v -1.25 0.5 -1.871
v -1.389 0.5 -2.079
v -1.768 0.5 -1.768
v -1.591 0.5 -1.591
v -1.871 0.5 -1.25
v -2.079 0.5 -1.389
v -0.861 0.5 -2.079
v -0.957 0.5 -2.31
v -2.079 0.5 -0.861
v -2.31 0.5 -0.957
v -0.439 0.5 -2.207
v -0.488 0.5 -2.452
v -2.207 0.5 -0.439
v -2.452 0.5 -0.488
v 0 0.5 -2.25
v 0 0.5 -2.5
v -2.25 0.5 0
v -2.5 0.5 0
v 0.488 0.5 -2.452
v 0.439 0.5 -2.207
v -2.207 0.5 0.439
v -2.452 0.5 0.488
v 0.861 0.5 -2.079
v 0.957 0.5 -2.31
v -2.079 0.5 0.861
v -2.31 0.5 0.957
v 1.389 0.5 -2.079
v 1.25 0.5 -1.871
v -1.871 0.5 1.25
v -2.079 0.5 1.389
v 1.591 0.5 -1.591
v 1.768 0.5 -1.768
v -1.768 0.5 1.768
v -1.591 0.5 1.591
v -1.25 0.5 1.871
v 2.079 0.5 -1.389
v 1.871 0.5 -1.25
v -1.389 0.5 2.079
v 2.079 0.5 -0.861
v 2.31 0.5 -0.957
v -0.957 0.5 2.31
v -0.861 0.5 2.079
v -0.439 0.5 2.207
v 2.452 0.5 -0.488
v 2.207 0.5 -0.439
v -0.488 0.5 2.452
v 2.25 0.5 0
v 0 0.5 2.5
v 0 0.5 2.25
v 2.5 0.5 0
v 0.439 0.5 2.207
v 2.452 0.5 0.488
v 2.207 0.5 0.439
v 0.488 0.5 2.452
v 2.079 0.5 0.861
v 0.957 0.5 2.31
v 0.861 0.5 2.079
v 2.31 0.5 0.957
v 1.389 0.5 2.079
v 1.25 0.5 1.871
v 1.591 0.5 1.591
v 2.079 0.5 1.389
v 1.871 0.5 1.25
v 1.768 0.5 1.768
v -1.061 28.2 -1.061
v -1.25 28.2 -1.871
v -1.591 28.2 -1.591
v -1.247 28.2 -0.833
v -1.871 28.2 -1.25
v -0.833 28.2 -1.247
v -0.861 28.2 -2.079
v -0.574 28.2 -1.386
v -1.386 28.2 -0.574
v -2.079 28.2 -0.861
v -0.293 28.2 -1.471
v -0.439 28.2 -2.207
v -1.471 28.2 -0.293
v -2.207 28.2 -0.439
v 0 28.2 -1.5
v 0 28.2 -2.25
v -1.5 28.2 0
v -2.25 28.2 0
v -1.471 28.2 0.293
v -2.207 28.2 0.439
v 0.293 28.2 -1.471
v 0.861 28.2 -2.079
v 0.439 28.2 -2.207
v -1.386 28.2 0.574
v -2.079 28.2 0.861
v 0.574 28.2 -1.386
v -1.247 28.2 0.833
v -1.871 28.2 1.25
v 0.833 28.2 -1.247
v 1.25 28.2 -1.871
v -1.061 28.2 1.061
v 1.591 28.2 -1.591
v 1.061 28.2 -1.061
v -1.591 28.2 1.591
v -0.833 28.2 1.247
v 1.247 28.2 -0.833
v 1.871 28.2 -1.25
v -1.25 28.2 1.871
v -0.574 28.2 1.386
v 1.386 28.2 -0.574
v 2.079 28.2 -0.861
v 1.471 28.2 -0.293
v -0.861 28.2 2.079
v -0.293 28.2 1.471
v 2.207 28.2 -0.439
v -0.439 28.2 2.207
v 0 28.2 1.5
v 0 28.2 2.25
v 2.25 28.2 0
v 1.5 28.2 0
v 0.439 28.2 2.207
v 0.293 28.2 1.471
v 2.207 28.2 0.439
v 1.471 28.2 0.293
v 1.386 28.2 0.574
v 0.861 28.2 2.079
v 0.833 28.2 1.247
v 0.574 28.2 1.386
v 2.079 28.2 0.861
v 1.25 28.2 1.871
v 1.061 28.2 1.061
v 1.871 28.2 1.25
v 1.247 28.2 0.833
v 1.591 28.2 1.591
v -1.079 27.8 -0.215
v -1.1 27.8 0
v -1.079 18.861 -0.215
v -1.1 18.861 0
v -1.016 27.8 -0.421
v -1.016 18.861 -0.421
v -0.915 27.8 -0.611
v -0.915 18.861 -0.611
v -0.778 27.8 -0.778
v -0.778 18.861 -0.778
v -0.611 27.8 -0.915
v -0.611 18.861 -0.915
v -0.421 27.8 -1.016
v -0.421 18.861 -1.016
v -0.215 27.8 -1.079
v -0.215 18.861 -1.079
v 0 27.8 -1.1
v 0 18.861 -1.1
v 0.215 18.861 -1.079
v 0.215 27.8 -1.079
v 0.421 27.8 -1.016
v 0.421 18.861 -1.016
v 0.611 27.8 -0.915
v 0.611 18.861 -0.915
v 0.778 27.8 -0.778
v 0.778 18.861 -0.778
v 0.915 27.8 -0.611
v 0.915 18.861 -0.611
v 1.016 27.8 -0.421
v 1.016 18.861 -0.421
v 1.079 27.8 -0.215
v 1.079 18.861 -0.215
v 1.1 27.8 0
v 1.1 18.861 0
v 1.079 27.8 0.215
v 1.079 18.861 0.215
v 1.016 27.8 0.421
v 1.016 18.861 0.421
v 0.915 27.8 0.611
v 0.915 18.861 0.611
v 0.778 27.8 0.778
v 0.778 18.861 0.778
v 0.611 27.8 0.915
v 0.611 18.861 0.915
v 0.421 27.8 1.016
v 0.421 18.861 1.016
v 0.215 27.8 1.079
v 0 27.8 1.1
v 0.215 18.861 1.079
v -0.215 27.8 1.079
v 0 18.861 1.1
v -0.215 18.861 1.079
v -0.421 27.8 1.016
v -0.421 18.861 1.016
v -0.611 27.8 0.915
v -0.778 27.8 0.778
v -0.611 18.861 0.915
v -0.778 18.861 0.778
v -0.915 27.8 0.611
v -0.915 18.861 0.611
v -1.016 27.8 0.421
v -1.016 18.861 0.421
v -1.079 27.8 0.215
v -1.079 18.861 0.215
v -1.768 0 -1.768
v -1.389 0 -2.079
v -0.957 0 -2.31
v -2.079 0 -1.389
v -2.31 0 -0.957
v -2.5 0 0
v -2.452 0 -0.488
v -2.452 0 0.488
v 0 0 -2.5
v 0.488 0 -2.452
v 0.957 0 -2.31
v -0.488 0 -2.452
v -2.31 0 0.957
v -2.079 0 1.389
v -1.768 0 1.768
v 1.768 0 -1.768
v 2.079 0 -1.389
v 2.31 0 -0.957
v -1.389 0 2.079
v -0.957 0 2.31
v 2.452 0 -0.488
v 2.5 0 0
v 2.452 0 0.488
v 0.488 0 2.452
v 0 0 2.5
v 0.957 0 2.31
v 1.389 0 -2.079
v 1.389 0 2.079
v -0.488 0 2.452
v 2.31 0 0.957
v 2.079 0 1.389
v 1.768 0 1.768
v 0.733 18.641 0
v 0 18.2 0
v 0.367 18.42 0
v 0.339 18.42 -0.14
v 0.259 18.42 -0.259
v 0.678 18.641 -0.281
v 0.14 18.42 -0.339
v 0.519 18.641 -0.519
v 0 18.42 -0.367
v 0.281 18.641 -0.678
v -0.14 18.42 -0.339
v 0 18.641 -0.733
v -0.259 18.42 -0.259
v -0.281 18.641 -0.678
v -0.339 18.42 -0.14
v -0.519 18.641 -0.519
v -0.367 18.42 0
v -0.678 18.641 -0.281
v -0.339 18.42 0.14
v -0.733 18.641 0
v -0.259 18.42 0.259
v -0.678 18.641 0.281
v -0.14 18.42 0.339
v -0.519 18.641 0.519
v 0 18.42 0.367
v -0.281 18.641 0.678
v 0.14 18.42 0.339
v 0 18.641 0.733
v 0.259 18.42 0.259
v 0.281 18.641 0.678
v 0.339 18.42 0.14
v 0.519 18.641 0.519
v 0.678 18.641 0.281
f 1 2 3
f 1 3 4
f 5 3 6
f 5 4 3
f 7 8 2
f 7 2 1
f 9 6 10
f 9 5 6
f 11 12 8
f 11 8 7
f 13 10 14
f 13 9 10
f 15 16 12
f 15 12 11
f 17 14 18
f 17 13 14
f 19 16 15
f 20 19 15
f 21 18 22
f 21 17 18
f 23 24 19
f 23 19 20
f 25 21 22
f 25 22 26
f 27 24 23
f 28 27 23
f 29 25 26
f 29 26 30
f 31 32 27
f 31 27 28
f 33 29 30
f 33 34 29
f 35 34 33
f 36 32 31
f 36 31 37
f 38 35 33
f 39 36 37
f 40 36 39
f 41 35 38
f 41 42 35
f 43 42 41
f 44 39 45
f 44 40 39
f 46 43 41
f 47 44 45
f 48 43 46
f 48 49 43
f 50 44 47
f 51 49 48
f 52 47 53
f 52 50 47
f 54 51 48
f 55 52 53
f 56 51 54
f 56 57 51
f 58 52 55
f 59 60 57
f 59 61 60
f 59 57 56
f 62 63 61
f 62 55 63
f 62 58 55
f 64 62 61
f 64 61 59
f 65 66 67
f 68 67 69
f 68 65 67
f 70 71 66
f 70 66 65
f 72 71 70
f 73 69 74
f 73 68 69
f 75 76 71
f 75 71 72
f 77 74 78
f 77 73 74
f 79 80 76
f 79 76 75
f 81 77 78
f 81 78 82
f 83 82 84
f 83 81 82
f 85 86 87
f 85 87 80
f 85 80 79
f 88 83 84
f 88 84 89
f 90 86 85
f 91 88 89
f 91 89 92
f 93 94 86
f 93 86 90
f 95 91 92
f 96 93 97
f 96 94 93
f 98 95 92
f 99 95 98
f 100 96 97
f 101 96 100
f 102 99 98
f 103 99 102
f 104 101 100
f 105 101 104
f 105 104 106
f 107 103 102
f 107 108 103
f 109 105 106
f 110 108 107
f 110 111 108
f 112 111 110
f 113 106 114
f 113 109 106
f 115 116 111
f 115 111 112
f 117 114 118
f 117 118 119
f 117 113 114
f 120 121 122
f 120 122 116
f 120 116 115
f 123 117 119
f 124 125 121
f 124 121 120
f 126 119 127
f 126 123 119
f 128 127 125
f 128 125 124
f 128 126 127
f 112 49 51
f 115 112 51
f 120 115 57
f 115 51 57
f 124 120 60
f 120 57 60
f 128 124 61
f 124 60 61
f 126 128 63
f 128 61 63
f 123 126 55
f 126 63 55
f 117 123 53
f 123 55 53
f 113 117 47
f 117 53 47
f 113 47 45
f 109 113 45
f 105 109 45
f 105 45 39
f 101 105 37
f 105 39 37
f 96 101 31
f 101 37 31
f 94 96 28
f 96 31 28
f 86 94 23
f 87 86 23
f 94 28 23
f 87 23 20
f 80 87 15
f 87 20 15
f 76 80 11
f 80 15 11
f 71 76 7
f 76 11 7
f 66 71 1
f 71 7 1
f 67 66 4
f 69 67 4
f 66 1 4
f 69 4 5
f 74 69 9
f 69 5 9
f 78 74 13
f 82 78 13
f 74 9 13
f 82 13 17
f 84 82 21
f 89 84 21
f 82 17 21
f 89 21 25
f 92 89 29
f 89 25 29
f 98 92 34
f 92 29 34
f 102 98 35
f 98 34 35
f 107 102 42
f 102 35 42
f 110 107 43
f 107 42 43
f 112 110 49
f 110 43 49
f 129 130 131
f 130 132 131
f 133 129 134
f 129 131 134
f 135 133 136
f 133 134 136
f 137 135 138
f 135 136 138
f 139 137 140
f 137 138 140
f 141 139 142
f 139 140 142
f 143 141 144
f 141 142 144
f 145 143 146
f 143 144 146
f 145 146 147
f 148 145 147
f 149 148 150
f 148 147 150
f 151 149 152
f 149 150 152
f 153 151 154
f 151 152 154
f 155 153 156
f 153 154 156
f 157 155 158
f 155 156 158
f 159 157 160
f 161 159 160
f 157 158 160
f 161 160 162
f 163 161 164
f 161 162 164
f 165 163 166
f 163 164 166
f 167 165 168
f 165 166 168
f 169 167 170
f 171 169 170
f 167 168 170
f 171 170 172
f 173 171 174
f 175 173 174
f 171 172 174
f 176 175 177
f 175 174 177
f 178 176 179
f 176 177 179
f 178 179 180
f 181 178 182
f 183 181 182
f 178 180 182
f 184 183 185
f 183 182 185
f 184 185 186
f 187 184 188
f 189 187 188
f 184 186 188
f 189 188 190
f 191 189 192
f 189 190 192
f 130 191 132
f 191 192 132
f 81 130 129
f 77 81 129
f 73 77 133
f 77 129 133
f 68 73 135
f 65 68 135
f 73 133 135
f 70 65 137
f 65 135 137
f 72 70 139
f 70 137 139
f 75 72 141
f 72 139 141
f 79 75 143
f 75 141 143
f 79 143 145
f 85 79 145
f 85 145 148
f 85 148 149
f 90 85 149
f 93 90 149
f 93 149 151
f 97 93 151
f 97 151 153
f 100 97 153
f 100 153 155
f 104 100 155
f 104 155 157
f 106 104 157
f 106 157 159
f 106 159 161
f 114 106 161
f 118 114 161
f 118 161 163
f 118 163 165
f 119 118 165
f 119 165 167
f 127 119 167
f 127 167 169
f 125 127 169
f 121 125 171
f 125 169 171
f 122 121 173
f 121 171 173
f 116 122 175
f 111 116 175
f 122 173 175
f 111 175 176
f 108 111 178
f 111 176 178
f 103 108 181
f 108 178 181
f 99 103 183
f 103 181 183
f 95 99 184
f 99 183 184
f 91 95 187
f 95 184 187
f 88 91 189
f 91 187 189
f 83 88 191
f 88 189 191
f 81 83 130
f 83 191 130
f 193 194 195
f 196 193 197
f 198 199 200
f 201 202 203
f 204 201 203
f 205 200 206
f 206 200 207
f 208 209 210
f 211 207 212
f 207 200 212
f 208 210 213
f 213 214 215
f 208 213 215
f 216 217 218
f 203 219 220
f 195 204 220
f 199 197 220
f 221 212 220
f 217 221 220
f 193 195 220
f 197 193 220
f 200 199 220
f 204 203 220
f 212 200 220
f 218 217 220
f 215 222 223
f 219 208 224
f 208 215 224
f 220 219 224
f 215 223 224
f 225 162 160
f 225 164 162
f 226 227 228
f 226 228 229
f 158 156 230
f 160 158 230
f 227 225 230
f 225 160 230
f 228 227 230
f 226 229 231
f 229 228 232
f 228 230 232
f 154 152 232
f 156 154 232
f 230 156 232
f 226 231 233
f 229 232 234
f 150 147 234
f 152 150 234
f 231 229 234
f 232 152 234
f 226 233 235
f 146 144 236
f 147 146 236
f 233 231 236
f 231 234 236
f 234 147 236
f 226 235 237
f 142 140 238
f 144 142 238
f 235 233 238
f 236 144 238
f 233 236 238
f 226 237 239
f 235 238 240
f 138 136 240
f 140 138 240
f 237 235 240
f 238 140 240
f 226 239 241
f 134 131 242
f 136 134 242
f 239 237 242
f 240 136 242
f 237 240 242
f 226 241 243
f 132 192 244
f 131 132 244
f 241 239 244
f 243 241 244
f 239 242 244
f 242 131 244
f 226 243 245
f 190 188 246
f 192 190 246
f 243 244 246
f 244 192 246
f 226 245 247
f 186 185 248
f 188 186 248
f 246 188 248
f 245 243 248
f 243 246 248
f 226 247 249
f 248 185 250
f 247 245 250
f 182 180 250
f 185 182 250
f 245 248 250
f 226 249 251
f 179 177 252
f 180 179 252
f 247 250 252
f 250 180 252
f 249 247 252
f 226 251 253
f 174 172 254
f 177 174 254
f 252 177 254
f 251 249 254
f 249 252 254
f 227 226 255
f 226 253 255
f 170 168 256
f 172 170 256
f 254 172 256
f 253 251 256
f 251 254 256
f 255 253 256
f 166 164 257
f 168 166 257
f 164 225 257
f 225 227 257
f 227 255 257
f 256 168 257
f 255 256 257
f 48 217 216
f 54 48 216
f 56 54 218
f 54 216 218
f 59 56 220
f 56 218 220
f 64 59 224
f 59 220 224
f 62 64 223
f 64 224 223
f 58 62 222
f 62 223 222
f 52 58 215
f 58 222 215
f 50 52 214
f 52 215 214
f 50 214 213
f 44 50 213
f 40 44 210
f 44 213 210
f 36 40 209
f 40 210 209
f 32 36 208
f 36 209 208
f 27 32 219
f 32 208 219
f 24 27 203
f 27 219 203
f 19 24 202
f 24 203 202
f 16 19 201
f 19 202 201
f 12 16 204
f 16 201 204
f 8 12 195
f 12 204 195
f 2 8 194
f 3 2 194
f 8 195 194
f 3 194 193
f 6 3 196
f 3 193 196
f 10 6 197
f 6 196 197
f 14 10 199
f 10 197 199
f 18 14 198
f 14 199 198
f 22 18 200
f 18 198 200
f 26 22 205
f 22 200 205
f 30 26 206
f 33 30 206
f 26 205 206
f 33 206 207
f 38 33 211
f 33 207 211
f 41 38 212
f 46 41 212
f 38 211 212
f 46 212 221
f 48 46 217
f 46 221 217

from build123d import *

# Parameters (mm, degrees)
SKETCH1_R                                           = 2.5
BOSS_EXTRUDE1_DEPTH                                 = 0.5
SKETCH2_R                                           = 2.25
BOSS_EXTRUDE2_DEPTH                                 = 27.7
CSK_FOR_M2_COUNTERSUNK_FLAT_HEAD_SCREW1_D           = 2.2
CSK_FOR_M2_COUNTERSUNK_FLAT_HEAD_SCREW1_DEPTH       = 9.339053319
CSK_FOR_M2_COUNTERSUNK_FLAT_HEAD_SCREW1_CSINK_D     = 3
CSK_FOR_M2_COUNTERSUNK_FLAT_HEAD_SCREW1_CSINK_ANGLE = 90
CSK_FOR_M2_COUNTERSUNK_FLAT_HEAD_SCREW1_TIP         = 0.660946681


with BuildPart() as part:
    # Sketch1 → Boss-Extrude1 (new body)
    with BuildSketch(Plane(origin=(0, 0, 0), x_dir=(1, 0, 0), z_dir=(0, 1, 0))):
        with Locations(Location((0, 0, 0), (0, 0, 270))):
            Circle(SKETCH1_R)
    extrude(amount=BOSS_EXTRUDE1_DEPTH)

    # Sketch2 → Boss-Extrude2 (add)
    with BuildSketch(Plane(origin=(0, 0.5, 0), x_dir=(1, 0, 0), z_dir=(0, 1, 0))):
        with Locations(Location((0, 0, 0), (0, 0, 270))):
            Circle(SKETCH2_R)
    extrude(amount=BOSS_EXTRUDE2_DEPTH)

    # CSK for M2 Countersunk Flat Head Screw1
    with Locations(Plane(origin=(0, 28.2, 0), x_dir=(1, 0, 0), z_dir=(0, 1, 0))):
        with Locations((0, 0)):
            CounterSinkHole(CSK_FOR_M2_COUNTERSUNK_FLAT_HEAD_SCREW1_D / 2, CSK_FOR_M2_COUNTERSUNK_FLAT_HEAD_SCREW1_CSINK_D / 2, depth=CSK_FOR_M2_COUNTERSUNK_FLAT_HEAD_SCREW1_DEPTH, counter_sink_angle=CSK_FOR_M2_COUNTERSUNK_FLAT_HEAD_SCREW1_CSINK_ANGLE)
            with Locations((0, 0, -(CSK_FOR_M2_COUNTERSUNK_FLAT_HEAD_SCREW1_DEPTH + CSK_FOR_M2_COUNTERSUNK_FLAT_HEAD_SCREW1_TIP / 2))):  # 118° drill point
                Cone(0, CSK_FOR_M2_COUNTERSUNK_FLAT_HEAD_SCREW1_D / 2, CSK_FOR_M2_COUNTERSUNK_FLAT_HEAD_SCREW1_TIP, mode=Mode.SUBTRACT)


solid = part.part
